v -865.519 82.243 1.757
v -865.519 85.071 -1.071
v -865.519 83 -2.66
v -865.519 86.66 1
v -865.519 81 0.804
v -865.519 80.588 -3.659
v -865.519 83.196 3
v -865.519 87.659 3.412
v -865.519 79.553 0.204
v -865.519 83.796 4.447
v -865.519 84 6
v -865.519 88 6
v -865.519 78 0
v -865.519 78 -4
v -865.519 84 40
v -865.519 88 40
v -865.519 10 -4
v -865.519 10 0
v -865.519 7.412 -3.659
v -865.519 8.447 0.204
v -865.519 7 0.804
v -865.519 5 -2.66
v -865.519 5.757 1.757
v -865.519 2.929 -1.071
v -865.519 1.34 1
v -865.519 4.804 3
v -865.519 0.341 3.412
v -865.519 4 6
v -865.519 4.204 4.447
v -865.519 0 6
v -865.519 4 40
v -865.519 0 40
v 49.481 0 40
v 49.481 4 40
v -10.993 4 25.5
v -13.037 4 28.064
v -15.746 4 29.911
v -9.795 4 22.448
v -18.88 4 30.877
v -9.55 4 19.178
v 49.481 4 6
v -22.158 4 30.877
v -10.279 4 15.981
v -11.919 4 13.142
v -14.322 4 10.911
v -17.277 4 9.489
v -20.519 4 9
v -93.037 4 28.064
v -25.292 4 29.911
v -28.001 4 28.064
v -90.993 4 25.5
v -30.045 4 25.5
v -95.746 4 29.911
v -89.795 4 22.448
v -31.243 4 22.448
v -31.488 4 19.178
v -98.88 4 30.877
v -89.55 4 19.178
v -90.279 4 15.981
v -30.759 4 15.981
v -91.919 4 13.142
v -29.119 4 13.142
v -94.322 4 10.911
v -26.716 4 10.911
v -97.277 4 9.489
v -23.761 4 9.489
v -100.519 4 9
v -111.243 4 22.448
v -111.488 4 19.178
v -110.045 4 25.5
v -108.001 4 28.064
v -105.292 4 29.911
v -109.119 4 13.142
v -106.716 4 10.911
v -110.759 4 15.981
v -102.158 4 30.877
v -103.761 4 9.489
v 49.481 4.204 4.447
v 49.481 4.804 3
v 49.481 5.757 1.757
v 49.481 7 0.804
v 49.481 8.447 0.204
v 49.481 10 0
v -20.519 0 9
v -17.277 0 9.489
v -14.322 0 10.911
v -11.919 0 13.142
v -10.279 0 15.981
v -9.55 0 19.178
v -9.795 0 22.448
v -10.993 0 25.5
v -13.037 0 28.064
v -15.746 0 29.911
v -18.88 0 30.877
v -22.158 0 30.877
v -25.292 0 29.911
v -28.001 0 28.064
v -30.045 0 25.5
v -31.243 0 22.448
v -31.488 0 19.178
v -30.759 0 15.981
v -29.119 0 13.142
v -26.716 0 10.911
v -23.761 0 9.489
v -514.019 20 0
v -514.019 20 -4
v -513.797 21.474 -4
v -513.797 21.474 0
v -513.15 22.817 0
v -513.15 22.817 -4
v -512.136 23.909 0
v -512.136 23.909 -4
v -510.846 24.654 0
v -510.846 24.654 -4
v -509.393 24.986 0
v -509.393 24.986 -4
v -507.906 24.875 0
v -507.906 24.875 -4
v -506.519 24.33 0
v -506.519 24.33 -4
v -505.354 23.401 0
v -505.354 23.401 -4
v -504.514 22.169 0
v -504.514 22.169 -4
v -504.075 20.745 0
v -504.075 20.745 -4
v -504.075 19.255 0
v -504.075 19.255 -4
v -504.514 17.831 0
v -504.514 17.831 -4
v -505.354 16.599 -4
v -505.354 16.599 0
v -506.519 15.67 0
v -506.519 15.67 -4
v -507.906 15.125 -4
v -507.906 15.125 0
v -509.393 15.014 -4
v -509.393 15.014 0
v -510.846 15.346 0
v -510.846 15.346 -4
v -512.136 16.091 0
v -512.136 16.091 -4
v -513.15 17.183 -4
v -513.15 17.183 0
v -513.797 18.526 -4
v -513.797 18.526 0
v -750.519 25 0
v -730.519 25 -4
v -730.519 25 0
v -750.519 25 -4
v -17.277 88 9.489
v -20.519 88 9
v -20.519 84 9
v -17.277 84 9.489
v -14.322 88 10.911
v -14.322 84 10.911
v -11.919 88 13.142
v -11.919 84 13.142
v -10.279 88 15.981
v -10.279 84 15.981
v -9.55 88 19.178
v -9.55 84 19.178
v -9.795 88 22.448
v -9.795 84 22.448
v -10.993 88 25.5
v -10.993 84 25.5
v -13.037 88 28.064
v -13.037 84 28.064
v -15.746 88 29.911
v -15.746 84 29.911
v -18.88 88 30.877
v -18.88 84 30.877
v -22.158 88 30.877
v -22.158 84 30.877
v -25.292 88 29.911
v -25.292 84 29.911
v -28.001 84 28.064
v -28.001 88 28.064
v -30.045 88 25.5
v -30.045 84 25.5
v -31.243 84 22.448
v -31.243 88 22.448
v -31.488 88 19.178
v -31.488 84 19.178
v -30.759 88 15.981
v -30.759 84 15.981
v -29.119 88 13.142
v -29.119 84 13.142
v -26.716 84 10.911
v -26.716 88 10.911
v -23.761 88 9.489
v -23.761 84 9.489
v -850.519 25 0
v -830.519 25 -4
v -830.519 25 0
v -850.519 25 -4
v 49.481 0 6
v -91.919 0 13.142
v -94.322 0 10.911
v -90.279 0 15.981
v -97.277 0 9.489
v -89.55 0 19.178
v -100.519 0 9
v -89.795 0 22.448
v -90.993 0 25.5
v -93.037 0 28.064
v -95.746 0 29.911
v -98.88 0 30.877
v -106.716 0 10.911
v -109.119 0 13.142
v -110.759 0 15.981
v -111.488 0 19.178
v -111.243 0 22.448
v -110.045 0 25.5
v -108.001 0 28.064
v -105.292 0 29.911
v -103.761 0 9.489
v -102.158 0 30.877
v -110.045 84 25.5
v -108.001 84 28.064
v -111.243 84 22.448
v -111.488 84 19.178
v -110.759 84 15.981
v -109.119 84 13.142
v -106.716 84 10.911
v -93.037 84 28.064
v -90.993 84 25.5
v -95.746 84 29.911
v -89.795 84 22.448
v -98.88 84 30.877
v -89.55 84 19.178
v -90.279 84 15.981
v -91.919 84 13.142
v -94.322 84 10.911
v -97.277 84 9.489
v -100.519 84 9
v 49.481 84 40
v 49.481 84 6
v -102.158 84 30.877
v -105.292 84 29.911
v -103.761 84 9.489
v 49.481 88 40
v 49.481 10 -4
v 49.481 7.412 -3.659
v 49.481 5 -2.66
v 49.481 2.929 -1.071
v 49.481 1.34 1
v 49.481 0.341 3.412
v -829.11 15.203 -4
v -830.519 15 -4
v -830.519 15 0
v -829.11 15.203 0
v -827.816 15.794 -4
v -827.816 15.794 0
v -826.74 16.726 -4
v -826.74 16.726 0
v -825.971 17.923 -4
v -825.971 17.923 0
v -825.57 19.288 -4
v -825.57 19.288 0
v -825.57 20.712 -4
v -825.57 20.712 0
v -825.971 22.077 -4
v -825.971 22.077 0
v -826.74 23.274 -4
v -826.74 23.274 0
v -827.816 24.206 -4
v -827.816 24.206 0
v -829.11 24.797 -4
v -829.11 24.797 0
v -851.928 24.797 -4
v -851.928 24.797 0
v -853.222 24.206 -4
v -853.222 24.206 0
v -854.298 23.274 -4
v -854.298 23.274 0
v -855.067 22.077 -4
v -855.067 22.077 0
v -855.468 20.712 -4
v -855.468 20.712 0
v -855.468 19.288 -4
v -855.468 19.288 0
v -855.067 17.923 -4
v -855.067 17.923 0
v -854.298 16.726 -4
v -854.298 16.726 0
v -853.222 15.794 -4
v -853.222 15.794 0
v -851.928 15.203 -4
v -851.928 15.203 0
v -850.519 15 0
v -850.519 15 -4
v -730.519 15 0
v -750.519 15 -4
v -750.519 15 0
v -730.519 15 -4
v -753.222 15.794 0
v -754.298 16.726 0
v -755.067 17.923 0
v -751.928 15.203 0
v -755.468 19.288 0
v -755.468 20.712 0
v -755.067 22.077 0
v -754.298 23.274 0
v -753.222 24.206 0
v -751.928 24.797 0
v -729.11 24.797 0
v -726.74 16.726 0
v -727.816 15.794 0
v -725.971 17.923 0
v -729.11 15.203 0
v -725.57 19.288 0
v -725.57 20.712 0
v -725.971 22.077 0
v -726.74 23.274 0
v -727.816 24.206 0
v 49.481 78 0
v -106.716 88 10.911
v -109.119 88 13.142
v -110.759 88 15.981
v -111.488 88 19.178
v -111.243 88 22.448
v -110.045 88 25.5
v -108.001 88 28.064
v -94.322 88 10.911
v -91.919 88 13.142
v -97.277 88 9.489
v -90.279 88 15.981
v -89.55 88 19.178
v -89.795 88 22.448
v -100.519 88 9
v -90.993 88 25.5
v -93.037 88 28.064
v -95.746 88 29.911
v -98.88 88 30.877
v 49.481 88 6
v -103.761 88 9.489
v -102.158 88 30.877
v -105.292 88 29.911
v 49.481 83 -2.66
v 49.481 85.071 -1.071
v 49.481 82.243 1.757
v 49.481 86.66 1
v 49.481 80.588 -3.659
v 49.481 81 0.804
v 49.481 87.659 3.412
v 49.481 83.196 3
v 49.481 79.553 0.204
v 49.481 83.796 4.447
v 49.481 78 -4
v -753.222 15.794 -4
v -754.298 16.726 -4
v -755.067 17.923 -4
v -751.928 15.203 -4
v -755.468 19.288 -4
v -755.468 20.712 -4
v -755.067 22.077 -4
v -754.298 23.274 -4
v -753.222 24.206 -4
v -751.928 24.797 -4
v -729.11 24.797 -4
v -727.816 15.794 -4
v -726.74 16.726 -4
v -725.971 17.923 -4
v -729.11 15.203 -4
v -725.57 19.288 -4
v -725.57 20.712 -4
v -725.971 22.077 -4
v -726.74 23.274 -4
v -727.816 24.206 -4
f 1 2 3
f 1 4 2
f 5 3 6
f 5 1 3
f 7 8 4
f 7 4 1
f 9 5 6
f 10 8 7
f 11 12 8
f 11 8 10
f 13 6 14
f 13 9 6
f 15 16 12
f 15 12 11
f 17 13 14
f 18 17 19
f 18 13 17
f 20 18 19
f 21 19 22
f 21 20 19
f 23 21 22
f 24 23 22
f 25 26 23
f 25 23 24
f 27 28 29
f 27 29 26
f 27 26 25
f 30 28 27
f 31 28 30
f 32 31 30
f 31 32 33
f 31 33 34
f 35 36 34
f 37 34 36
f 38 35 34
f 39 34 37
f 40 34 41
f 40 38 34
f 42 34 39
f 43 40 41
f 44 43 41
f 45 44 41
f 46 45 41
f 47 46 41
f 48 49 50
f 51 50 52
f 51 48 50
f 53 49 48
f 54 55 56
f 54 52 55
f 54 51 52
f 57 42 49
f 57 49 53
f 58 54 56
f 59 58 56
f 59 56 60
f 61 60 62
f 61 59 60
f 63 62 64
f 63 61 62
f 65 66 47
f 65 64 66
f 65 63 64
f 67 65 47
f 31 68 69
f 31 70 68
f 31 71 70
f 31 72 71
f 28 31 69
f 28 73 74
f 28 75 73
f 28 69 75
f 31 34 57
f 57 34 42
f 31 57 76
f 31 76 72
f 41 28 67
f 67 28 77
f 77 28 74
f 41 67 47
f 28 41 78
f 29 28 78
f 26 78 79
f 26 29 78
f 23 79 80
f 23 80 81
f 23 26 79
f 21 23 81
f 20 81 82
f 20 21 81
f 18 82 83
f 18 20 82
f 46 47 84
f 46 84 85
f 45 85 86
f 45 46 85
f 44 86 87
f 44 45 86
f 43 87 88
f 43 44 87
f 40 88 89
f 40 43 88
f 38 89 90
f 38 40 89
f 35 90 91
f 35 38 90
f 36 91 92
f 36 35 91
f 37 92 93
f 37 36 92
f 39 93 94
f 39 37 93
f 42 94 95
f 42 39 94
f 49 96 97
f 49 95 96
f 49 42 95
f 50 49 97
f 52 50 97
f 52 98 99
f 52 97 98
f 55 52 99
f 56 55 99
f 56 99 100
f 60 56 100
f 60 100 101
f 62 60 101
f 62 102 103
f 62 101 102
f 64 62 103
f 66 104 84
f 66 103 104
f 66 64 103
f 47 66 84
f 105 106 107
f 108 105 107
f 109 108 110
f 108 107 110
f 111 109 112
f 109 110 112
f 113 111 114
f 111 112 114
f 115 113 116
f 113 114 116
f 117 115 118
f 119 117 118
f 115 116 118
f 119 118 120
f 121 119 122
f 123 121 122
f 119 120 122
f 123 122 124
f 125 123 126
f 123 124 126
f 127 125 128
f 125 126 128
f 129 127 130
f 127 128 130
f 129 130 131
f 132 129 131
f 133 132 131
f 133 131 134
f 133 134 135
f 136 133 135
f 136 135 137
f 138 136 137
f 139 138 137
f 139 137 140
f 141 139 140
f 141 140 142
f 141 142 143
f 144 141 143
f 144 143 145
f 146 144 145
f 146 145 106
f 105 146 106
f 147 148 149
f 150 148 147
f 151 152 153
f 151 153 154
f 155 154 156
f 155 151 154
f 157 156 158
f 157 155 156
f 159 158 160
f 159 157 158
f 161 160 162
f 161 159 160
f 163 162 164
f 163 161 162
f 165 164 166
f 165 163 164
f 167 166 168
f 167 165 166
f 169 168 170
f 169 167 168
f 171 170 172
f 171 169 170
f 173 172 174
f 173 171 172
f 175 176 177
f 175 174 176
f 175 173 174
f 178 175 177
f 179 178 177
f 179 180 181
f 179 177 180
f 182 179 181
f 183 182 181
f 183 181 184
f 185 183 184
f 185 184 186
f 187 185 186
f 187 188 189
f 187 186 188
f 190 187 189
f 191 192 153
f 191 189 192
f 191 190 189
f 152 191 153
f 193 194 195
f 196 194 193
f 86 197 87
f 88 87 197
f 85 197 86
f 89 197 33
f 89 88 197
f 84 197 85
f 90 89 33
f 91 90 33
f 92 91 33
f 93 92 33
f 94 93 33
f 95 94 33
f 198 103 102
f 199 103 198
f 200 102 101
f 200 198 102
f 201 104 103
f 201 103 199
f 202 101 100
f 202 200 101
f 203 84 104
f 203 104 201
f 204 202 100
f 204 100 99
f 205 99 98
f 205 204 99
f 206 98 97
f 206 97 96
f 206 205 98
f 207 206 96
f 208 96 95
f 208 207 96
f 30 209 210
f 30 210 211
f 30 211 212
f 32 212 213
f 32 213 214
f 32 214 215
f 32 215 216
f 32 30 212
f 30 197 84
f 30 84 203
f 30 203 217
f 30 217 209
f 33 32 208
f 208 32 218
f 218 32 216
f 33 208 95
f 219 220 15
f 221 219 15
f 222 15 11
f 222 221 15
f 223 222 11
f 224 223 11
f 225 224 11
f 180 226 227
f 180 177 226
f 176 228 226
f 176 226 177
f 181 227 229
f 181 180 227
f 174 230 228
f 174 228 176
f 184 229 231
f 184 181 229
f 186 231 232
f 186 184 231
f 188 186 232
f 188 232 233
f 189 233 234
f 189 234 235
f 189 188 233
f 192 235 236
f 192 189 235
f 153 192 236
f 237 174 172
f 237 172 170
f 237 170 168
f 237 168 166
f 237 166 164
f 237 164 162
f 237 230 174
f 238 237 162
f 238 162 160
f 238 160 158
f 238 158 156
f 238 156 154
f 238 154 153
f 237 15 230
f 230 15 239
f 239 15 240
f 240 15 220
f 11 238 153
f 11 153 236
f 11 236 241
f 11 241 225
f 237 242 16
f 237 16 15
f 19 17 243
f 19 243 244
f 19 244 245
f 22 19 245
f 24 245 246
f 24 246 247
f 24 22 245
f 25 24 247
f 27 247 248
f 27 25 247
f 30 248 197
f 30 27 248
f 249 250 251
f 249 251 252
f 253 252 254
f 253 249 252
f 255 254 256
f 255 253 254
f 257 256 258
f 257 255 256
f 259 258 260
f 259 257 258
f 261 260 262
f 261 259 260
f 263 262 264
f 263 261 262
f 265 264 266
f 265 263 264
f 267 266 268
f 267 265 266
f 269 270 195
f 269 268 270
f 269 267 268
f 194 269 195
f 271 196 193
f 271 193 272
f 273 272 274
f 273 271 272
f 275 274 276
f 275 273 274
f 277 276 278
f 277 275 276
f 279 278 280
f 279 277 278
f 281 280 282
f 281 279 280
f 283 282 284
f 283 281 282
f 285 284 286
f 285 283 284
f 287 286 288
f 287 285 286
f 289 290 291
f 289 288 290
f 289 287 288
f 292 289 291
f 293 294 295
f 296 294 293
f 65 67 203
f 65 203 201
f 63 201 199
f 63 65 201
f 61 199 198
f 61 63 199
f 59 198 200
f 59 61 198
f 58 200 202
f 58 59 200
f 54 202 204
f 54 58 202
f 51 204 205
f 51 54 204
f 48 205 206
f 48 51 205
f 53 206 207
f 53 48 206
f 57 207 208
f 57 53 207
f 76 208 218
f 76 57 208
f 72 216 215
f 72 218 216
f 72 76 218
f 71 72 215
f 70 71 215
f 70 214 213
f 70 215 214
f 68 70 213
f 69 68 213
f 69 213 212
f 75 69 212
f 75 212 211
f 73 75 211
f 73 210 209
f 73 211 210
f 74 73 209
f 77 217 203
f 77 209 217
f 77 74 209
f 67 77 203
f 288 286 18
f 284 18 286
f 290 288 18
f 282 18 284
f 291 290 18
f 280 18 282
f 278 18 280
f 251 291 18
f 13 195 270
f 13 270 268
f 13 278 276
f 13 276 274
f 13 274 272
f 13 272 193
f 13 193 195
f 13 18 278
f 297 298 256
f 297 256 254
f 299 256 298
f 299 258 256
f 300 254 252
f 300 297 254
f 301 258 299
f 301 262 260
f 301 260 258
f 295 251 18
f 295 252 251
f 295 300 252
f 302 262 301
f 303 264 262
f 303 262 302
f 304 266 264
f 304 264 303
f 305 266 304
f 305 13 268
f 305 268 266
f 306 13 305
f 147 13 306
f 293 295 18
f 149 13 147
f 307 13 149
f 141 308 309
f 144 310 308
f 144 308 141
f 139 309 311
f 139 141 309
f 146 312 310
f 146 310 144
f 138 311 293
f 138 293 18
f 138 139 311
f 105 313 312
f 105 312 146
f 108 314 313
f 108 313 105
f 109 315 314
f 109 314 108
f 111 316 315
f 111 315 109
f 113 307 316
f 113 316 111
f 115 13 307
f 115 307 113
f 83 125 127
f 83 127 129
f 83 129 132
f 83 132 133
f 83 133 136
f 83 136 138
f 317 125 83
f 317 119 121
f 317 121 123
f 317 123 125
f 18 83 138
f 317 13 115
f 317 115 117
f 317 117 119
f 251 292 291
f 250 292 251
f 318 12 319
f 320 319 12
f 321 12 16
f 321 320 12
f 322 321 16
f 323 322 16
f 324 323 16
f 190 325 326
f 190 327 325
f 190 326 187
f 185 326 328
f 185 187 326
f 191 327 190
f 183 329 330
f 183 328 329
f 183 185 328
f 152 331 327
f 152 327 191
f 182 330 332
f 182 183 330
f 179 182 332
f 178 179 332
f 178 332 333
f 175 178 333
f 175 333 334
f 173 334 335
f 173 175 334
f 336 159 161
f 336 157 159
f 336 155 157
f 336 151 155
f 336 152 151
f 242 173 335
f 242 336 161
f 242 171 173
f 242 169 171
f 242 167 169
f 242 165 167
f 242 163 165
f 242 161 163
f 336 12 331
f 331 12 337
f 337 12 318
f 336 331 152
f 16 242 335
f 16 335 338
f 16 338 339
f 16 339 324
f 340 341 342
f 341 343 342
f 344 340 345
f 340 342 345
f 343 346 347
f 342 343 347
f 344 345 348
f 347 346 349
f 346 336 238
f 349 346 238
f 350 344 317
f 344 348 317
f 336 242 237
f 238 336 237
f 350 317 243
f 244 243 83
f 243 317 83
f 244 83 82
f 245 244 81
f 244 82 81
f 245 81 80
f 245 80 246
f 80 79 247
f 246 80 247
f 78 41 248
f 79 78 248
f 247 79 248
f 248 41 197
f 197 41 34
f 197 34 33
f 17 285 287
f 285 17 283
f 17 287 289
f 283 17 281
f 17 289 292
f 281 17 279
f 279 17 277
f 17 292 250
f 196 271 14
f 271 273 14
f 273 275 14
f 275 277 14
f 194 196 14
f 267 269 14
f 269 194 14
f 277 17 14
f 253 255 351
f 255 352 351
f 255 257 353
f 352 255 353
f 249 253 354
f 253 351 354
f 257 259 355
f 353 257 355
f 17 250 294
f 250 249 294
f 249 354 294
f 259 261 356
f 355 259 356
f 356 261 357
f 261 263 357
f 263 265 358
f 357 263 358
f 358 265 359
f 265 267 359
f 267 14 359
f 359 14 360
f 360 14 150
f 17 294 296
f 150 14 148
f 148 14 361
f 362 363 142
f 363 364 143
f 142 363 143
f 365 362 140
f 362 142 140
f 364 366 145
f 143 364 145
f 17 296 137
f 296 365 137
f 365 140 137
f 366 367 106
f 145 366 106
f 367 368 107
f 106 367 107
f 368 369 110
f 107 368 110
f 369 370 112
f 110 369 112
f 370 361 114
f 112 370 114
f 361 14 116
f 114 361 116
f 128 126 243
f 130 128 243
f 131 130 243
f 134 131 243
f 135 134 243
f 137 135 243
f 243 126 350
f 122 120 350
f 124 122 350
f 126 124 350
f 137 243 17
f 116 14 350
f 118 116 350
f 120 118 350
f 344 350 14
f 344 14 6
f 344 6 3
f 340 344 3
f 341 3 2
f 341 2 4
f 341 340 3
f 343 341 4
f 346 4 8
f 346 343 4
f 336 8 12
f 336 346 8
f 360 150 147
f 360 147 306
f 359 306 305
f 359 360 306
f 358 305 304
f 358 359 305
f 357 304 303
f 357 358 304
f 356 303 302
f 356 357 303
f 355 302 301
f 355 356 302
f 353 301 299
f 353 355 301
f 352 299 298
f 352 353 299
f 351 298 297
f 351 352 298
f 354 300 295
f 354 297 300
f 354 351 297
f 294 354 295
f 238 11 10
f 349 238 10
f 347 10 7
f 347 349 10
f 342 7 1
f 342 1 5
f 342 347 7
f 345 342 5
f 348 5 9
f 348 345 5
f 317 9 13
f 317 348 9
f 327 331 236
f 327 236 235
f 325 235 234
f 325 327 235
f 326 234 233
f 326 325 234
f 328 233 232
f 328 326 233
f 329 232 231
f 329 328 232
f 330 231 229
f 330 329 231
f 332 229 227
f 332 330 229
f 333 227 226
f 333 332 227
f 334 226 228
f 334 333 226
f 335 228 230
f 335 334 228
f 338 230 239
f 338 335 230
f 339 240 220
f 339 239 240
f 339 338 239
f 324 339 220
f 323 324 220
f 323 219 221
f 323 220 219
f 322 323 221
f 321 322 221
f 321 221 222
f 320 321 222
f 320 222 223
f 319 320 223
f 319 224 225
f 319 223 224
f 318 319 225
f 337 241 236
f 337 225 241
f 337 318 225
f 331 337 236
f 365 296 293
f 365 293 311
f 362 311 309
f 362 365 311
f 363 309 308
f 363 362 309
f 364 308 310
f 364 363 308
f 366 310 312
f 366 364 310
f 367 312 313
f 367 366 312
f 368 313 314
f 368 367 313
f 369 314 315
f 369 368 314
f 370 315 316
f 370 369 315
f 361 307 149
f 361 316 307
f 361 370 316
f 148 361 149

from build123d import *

# Parameters (mm, degrees)
SKETCH1_W                    = 915
SKETCH1_H                    = 88
BASE_FLANGE1_DEPTH           = 4
EDGE_FLANGE1_STRIP_W         = 28
EDGE_FLANGE1_STRIP_H         = 4
EDGE_FLANGE1_STRIP_CUT_DEPTH = 915
EDGE_FLANGE1_DEPTH           = 915
EDGE_FLANGE2_STRIP_W         = 28
EDGE_FLANGE2_STRIP_H         = 4
EDGE_FLANGE2_STRIP_CUT_DEPTH = 915
EDGE_FLANGE2_DEPTH           = 915
CUT_EXTRUDE1_DEPTH           = 871.900176512
CUT_EXTRUDE1_DEPTH_BACK      = 871.900176512
SKETCH12_R                   = 11
CUT_EXTRUDE2_DEPTH           = 872.093059006
SKETCH16_R                   = 5
CUT_EXTRUDE4_DEPTH           = 10


# Sheet-metal steps are written as plain solids
with BuildPart() as part:
    # Sketch1 → Base-Flange1 (new body)
    with BuildSketch(Plane.XY):
        with Locations((-408.018987342, 44)):
            Rectangle(SKETCH1_W, SKETCH1_H)
    extrude(amount=-BASE_FLANGE1_DEPTH)

    # Edge-Flange1 strip (across the edge) → Edge-Flange1 strip cut (cut)
    with BuildSketch(Plane(origin=(49.481012658, 88, 0), x_dir=(0, -1, 0), z_dir=(-1, 0, 0))):
        with Locations((-4, -2)):
            Rectangle(EDGE_FLANGE1_STRIP_W, EDGE_FLANGE1_STRIP_H)
    extrude(amount=EDGE_FLANGE1_STRIP_CUT_DEPTH, mode=Mode.SUBTRACT)

    # Edge-Flange1 section (across the edge) → Edge-Flange1 (add)
    with BuildSketch(Plane(origin=(49.481012658, 88, 0), x_dir=(0, -1, 0), z_dir=(-1, 0, 0))):
        with BuildLine():
            Line((0, 6), (0, 40))
            Line((0, 40), (4, 40))
            Line((4, 40), (4, 6))
            ThreePointArc((4, 6), (5.757359313, 1.757359313), (10, 0))
            Line((10, 0), (10, -4))
            ThreePointArc((10, -4), (2.928932188, -1.071067812), (0, 6))
        make_face()
    extrude(amount=EDGE_FLANGE1_DEPTH)

    # Edge-Flange2 strip (across the edge) → Edge-Flange2 strip cut (cut)
    with BuildSketch(Plane.YZ.offset(-865.518987342)):
        with Locations((-4, -2)):
            Rectangle(EDGE_FLANGE2_STRIP_W, EDGE_FLANGE2_STRIP_H)
    extrude(amount=EDGE_FLANGE2_STRIP_CUT_DEPTH, mode=Mode.SUBTRACT)

    # Edge-Flange2 section (across the edge) → Edge-Flange2 (add)
    with BuildSketch(Plane.YZ.offset(-865.518987342)):
        with BuildLine():
            Line((0, 6), (0, 40))
            Line((0, 40), (4, 40))
            Line((4, 40), (4, 6))
            ThreePointArc((4, 6), (5.757359313, 1.757359313), (10, 0))
            Line((10, 0), (10, -4))
            ThreePointArc((10, -4), (2.928932188, -1.071067812), (0, 6))
        make_face()
    extrude(amount=EDGE_FLANGE2_DEPTH)

    # Sketch12 → Cut-Extrude1 (cut, two sides: drawn at the far end of the back side and taken through both)
    with BuildSketch(Plane.XZ.offset(-CUT_EXTRUDE1_DEPTH_BACK)):
        with Locations(Location((-100.518987342, 20, 0), (0, 0, 270))):
            Circle(SKETCH12_R)
        with Locations(Location((-20.518987342, 20, 0), (0, 0, 270))):
            Circle(SKETCH12_R)
    extrude(amount=CUT_EXTRUDE1_DEPTH + CUT_EXTRUDE1_DEPTH_BACK, mode=Mode.SUBTRACT)

    # Sketch13 → Cut-Extrude2 (cut, through all)
    with BuildSketch(Plane(origin=(0, 0, -4), x_dir=(-1, 0, 0), z_dir=(0, 0, -1))):
        with BuildLine():
            Line((850.518987342, 15), (830.518987342, 15))
            ThreePointArc((830.518987342, 15), (825.518987342, 20), (830.518987342, 25))
            Line((830.518987342, 25), (850.518987342, 25))
            ThreePointArc((850.518987342, 25), (855.518987342, 20), (850.518987342, 15))
        make_face()
        with BuildLine():
            Line((750.518987342, 15), (730.518987342, 15))
            ThreePointArc((730.518987342, 15), (725.518987342, 20), (730.518987342, 25))
            Line((730.518987342, 25), (750.518987342, 25))
            ThreePointArc((750.518987342, 25), (755.518987342, 20), (750.518987342, 15))
        make_face()
    extrude(amount=-CUT_EXTRUDE2_DEPTH, mode=Mode.SUBTRACT)

    # Sketch16 → Cut-Extrude4 (cut)
    with BuildSketch(Plane(origin=(0, 0, -4), x_dir=(-1, 0, 0), z_dir=(0, 0, -1))):
        with Locations((509.018987342, 20)):
            Circle(SKETCH16_R)
    extrude(amount=-CUT_EXTRUDE4_DEPTH, mode=Mode.SUBTRACT)


solid = part.part
